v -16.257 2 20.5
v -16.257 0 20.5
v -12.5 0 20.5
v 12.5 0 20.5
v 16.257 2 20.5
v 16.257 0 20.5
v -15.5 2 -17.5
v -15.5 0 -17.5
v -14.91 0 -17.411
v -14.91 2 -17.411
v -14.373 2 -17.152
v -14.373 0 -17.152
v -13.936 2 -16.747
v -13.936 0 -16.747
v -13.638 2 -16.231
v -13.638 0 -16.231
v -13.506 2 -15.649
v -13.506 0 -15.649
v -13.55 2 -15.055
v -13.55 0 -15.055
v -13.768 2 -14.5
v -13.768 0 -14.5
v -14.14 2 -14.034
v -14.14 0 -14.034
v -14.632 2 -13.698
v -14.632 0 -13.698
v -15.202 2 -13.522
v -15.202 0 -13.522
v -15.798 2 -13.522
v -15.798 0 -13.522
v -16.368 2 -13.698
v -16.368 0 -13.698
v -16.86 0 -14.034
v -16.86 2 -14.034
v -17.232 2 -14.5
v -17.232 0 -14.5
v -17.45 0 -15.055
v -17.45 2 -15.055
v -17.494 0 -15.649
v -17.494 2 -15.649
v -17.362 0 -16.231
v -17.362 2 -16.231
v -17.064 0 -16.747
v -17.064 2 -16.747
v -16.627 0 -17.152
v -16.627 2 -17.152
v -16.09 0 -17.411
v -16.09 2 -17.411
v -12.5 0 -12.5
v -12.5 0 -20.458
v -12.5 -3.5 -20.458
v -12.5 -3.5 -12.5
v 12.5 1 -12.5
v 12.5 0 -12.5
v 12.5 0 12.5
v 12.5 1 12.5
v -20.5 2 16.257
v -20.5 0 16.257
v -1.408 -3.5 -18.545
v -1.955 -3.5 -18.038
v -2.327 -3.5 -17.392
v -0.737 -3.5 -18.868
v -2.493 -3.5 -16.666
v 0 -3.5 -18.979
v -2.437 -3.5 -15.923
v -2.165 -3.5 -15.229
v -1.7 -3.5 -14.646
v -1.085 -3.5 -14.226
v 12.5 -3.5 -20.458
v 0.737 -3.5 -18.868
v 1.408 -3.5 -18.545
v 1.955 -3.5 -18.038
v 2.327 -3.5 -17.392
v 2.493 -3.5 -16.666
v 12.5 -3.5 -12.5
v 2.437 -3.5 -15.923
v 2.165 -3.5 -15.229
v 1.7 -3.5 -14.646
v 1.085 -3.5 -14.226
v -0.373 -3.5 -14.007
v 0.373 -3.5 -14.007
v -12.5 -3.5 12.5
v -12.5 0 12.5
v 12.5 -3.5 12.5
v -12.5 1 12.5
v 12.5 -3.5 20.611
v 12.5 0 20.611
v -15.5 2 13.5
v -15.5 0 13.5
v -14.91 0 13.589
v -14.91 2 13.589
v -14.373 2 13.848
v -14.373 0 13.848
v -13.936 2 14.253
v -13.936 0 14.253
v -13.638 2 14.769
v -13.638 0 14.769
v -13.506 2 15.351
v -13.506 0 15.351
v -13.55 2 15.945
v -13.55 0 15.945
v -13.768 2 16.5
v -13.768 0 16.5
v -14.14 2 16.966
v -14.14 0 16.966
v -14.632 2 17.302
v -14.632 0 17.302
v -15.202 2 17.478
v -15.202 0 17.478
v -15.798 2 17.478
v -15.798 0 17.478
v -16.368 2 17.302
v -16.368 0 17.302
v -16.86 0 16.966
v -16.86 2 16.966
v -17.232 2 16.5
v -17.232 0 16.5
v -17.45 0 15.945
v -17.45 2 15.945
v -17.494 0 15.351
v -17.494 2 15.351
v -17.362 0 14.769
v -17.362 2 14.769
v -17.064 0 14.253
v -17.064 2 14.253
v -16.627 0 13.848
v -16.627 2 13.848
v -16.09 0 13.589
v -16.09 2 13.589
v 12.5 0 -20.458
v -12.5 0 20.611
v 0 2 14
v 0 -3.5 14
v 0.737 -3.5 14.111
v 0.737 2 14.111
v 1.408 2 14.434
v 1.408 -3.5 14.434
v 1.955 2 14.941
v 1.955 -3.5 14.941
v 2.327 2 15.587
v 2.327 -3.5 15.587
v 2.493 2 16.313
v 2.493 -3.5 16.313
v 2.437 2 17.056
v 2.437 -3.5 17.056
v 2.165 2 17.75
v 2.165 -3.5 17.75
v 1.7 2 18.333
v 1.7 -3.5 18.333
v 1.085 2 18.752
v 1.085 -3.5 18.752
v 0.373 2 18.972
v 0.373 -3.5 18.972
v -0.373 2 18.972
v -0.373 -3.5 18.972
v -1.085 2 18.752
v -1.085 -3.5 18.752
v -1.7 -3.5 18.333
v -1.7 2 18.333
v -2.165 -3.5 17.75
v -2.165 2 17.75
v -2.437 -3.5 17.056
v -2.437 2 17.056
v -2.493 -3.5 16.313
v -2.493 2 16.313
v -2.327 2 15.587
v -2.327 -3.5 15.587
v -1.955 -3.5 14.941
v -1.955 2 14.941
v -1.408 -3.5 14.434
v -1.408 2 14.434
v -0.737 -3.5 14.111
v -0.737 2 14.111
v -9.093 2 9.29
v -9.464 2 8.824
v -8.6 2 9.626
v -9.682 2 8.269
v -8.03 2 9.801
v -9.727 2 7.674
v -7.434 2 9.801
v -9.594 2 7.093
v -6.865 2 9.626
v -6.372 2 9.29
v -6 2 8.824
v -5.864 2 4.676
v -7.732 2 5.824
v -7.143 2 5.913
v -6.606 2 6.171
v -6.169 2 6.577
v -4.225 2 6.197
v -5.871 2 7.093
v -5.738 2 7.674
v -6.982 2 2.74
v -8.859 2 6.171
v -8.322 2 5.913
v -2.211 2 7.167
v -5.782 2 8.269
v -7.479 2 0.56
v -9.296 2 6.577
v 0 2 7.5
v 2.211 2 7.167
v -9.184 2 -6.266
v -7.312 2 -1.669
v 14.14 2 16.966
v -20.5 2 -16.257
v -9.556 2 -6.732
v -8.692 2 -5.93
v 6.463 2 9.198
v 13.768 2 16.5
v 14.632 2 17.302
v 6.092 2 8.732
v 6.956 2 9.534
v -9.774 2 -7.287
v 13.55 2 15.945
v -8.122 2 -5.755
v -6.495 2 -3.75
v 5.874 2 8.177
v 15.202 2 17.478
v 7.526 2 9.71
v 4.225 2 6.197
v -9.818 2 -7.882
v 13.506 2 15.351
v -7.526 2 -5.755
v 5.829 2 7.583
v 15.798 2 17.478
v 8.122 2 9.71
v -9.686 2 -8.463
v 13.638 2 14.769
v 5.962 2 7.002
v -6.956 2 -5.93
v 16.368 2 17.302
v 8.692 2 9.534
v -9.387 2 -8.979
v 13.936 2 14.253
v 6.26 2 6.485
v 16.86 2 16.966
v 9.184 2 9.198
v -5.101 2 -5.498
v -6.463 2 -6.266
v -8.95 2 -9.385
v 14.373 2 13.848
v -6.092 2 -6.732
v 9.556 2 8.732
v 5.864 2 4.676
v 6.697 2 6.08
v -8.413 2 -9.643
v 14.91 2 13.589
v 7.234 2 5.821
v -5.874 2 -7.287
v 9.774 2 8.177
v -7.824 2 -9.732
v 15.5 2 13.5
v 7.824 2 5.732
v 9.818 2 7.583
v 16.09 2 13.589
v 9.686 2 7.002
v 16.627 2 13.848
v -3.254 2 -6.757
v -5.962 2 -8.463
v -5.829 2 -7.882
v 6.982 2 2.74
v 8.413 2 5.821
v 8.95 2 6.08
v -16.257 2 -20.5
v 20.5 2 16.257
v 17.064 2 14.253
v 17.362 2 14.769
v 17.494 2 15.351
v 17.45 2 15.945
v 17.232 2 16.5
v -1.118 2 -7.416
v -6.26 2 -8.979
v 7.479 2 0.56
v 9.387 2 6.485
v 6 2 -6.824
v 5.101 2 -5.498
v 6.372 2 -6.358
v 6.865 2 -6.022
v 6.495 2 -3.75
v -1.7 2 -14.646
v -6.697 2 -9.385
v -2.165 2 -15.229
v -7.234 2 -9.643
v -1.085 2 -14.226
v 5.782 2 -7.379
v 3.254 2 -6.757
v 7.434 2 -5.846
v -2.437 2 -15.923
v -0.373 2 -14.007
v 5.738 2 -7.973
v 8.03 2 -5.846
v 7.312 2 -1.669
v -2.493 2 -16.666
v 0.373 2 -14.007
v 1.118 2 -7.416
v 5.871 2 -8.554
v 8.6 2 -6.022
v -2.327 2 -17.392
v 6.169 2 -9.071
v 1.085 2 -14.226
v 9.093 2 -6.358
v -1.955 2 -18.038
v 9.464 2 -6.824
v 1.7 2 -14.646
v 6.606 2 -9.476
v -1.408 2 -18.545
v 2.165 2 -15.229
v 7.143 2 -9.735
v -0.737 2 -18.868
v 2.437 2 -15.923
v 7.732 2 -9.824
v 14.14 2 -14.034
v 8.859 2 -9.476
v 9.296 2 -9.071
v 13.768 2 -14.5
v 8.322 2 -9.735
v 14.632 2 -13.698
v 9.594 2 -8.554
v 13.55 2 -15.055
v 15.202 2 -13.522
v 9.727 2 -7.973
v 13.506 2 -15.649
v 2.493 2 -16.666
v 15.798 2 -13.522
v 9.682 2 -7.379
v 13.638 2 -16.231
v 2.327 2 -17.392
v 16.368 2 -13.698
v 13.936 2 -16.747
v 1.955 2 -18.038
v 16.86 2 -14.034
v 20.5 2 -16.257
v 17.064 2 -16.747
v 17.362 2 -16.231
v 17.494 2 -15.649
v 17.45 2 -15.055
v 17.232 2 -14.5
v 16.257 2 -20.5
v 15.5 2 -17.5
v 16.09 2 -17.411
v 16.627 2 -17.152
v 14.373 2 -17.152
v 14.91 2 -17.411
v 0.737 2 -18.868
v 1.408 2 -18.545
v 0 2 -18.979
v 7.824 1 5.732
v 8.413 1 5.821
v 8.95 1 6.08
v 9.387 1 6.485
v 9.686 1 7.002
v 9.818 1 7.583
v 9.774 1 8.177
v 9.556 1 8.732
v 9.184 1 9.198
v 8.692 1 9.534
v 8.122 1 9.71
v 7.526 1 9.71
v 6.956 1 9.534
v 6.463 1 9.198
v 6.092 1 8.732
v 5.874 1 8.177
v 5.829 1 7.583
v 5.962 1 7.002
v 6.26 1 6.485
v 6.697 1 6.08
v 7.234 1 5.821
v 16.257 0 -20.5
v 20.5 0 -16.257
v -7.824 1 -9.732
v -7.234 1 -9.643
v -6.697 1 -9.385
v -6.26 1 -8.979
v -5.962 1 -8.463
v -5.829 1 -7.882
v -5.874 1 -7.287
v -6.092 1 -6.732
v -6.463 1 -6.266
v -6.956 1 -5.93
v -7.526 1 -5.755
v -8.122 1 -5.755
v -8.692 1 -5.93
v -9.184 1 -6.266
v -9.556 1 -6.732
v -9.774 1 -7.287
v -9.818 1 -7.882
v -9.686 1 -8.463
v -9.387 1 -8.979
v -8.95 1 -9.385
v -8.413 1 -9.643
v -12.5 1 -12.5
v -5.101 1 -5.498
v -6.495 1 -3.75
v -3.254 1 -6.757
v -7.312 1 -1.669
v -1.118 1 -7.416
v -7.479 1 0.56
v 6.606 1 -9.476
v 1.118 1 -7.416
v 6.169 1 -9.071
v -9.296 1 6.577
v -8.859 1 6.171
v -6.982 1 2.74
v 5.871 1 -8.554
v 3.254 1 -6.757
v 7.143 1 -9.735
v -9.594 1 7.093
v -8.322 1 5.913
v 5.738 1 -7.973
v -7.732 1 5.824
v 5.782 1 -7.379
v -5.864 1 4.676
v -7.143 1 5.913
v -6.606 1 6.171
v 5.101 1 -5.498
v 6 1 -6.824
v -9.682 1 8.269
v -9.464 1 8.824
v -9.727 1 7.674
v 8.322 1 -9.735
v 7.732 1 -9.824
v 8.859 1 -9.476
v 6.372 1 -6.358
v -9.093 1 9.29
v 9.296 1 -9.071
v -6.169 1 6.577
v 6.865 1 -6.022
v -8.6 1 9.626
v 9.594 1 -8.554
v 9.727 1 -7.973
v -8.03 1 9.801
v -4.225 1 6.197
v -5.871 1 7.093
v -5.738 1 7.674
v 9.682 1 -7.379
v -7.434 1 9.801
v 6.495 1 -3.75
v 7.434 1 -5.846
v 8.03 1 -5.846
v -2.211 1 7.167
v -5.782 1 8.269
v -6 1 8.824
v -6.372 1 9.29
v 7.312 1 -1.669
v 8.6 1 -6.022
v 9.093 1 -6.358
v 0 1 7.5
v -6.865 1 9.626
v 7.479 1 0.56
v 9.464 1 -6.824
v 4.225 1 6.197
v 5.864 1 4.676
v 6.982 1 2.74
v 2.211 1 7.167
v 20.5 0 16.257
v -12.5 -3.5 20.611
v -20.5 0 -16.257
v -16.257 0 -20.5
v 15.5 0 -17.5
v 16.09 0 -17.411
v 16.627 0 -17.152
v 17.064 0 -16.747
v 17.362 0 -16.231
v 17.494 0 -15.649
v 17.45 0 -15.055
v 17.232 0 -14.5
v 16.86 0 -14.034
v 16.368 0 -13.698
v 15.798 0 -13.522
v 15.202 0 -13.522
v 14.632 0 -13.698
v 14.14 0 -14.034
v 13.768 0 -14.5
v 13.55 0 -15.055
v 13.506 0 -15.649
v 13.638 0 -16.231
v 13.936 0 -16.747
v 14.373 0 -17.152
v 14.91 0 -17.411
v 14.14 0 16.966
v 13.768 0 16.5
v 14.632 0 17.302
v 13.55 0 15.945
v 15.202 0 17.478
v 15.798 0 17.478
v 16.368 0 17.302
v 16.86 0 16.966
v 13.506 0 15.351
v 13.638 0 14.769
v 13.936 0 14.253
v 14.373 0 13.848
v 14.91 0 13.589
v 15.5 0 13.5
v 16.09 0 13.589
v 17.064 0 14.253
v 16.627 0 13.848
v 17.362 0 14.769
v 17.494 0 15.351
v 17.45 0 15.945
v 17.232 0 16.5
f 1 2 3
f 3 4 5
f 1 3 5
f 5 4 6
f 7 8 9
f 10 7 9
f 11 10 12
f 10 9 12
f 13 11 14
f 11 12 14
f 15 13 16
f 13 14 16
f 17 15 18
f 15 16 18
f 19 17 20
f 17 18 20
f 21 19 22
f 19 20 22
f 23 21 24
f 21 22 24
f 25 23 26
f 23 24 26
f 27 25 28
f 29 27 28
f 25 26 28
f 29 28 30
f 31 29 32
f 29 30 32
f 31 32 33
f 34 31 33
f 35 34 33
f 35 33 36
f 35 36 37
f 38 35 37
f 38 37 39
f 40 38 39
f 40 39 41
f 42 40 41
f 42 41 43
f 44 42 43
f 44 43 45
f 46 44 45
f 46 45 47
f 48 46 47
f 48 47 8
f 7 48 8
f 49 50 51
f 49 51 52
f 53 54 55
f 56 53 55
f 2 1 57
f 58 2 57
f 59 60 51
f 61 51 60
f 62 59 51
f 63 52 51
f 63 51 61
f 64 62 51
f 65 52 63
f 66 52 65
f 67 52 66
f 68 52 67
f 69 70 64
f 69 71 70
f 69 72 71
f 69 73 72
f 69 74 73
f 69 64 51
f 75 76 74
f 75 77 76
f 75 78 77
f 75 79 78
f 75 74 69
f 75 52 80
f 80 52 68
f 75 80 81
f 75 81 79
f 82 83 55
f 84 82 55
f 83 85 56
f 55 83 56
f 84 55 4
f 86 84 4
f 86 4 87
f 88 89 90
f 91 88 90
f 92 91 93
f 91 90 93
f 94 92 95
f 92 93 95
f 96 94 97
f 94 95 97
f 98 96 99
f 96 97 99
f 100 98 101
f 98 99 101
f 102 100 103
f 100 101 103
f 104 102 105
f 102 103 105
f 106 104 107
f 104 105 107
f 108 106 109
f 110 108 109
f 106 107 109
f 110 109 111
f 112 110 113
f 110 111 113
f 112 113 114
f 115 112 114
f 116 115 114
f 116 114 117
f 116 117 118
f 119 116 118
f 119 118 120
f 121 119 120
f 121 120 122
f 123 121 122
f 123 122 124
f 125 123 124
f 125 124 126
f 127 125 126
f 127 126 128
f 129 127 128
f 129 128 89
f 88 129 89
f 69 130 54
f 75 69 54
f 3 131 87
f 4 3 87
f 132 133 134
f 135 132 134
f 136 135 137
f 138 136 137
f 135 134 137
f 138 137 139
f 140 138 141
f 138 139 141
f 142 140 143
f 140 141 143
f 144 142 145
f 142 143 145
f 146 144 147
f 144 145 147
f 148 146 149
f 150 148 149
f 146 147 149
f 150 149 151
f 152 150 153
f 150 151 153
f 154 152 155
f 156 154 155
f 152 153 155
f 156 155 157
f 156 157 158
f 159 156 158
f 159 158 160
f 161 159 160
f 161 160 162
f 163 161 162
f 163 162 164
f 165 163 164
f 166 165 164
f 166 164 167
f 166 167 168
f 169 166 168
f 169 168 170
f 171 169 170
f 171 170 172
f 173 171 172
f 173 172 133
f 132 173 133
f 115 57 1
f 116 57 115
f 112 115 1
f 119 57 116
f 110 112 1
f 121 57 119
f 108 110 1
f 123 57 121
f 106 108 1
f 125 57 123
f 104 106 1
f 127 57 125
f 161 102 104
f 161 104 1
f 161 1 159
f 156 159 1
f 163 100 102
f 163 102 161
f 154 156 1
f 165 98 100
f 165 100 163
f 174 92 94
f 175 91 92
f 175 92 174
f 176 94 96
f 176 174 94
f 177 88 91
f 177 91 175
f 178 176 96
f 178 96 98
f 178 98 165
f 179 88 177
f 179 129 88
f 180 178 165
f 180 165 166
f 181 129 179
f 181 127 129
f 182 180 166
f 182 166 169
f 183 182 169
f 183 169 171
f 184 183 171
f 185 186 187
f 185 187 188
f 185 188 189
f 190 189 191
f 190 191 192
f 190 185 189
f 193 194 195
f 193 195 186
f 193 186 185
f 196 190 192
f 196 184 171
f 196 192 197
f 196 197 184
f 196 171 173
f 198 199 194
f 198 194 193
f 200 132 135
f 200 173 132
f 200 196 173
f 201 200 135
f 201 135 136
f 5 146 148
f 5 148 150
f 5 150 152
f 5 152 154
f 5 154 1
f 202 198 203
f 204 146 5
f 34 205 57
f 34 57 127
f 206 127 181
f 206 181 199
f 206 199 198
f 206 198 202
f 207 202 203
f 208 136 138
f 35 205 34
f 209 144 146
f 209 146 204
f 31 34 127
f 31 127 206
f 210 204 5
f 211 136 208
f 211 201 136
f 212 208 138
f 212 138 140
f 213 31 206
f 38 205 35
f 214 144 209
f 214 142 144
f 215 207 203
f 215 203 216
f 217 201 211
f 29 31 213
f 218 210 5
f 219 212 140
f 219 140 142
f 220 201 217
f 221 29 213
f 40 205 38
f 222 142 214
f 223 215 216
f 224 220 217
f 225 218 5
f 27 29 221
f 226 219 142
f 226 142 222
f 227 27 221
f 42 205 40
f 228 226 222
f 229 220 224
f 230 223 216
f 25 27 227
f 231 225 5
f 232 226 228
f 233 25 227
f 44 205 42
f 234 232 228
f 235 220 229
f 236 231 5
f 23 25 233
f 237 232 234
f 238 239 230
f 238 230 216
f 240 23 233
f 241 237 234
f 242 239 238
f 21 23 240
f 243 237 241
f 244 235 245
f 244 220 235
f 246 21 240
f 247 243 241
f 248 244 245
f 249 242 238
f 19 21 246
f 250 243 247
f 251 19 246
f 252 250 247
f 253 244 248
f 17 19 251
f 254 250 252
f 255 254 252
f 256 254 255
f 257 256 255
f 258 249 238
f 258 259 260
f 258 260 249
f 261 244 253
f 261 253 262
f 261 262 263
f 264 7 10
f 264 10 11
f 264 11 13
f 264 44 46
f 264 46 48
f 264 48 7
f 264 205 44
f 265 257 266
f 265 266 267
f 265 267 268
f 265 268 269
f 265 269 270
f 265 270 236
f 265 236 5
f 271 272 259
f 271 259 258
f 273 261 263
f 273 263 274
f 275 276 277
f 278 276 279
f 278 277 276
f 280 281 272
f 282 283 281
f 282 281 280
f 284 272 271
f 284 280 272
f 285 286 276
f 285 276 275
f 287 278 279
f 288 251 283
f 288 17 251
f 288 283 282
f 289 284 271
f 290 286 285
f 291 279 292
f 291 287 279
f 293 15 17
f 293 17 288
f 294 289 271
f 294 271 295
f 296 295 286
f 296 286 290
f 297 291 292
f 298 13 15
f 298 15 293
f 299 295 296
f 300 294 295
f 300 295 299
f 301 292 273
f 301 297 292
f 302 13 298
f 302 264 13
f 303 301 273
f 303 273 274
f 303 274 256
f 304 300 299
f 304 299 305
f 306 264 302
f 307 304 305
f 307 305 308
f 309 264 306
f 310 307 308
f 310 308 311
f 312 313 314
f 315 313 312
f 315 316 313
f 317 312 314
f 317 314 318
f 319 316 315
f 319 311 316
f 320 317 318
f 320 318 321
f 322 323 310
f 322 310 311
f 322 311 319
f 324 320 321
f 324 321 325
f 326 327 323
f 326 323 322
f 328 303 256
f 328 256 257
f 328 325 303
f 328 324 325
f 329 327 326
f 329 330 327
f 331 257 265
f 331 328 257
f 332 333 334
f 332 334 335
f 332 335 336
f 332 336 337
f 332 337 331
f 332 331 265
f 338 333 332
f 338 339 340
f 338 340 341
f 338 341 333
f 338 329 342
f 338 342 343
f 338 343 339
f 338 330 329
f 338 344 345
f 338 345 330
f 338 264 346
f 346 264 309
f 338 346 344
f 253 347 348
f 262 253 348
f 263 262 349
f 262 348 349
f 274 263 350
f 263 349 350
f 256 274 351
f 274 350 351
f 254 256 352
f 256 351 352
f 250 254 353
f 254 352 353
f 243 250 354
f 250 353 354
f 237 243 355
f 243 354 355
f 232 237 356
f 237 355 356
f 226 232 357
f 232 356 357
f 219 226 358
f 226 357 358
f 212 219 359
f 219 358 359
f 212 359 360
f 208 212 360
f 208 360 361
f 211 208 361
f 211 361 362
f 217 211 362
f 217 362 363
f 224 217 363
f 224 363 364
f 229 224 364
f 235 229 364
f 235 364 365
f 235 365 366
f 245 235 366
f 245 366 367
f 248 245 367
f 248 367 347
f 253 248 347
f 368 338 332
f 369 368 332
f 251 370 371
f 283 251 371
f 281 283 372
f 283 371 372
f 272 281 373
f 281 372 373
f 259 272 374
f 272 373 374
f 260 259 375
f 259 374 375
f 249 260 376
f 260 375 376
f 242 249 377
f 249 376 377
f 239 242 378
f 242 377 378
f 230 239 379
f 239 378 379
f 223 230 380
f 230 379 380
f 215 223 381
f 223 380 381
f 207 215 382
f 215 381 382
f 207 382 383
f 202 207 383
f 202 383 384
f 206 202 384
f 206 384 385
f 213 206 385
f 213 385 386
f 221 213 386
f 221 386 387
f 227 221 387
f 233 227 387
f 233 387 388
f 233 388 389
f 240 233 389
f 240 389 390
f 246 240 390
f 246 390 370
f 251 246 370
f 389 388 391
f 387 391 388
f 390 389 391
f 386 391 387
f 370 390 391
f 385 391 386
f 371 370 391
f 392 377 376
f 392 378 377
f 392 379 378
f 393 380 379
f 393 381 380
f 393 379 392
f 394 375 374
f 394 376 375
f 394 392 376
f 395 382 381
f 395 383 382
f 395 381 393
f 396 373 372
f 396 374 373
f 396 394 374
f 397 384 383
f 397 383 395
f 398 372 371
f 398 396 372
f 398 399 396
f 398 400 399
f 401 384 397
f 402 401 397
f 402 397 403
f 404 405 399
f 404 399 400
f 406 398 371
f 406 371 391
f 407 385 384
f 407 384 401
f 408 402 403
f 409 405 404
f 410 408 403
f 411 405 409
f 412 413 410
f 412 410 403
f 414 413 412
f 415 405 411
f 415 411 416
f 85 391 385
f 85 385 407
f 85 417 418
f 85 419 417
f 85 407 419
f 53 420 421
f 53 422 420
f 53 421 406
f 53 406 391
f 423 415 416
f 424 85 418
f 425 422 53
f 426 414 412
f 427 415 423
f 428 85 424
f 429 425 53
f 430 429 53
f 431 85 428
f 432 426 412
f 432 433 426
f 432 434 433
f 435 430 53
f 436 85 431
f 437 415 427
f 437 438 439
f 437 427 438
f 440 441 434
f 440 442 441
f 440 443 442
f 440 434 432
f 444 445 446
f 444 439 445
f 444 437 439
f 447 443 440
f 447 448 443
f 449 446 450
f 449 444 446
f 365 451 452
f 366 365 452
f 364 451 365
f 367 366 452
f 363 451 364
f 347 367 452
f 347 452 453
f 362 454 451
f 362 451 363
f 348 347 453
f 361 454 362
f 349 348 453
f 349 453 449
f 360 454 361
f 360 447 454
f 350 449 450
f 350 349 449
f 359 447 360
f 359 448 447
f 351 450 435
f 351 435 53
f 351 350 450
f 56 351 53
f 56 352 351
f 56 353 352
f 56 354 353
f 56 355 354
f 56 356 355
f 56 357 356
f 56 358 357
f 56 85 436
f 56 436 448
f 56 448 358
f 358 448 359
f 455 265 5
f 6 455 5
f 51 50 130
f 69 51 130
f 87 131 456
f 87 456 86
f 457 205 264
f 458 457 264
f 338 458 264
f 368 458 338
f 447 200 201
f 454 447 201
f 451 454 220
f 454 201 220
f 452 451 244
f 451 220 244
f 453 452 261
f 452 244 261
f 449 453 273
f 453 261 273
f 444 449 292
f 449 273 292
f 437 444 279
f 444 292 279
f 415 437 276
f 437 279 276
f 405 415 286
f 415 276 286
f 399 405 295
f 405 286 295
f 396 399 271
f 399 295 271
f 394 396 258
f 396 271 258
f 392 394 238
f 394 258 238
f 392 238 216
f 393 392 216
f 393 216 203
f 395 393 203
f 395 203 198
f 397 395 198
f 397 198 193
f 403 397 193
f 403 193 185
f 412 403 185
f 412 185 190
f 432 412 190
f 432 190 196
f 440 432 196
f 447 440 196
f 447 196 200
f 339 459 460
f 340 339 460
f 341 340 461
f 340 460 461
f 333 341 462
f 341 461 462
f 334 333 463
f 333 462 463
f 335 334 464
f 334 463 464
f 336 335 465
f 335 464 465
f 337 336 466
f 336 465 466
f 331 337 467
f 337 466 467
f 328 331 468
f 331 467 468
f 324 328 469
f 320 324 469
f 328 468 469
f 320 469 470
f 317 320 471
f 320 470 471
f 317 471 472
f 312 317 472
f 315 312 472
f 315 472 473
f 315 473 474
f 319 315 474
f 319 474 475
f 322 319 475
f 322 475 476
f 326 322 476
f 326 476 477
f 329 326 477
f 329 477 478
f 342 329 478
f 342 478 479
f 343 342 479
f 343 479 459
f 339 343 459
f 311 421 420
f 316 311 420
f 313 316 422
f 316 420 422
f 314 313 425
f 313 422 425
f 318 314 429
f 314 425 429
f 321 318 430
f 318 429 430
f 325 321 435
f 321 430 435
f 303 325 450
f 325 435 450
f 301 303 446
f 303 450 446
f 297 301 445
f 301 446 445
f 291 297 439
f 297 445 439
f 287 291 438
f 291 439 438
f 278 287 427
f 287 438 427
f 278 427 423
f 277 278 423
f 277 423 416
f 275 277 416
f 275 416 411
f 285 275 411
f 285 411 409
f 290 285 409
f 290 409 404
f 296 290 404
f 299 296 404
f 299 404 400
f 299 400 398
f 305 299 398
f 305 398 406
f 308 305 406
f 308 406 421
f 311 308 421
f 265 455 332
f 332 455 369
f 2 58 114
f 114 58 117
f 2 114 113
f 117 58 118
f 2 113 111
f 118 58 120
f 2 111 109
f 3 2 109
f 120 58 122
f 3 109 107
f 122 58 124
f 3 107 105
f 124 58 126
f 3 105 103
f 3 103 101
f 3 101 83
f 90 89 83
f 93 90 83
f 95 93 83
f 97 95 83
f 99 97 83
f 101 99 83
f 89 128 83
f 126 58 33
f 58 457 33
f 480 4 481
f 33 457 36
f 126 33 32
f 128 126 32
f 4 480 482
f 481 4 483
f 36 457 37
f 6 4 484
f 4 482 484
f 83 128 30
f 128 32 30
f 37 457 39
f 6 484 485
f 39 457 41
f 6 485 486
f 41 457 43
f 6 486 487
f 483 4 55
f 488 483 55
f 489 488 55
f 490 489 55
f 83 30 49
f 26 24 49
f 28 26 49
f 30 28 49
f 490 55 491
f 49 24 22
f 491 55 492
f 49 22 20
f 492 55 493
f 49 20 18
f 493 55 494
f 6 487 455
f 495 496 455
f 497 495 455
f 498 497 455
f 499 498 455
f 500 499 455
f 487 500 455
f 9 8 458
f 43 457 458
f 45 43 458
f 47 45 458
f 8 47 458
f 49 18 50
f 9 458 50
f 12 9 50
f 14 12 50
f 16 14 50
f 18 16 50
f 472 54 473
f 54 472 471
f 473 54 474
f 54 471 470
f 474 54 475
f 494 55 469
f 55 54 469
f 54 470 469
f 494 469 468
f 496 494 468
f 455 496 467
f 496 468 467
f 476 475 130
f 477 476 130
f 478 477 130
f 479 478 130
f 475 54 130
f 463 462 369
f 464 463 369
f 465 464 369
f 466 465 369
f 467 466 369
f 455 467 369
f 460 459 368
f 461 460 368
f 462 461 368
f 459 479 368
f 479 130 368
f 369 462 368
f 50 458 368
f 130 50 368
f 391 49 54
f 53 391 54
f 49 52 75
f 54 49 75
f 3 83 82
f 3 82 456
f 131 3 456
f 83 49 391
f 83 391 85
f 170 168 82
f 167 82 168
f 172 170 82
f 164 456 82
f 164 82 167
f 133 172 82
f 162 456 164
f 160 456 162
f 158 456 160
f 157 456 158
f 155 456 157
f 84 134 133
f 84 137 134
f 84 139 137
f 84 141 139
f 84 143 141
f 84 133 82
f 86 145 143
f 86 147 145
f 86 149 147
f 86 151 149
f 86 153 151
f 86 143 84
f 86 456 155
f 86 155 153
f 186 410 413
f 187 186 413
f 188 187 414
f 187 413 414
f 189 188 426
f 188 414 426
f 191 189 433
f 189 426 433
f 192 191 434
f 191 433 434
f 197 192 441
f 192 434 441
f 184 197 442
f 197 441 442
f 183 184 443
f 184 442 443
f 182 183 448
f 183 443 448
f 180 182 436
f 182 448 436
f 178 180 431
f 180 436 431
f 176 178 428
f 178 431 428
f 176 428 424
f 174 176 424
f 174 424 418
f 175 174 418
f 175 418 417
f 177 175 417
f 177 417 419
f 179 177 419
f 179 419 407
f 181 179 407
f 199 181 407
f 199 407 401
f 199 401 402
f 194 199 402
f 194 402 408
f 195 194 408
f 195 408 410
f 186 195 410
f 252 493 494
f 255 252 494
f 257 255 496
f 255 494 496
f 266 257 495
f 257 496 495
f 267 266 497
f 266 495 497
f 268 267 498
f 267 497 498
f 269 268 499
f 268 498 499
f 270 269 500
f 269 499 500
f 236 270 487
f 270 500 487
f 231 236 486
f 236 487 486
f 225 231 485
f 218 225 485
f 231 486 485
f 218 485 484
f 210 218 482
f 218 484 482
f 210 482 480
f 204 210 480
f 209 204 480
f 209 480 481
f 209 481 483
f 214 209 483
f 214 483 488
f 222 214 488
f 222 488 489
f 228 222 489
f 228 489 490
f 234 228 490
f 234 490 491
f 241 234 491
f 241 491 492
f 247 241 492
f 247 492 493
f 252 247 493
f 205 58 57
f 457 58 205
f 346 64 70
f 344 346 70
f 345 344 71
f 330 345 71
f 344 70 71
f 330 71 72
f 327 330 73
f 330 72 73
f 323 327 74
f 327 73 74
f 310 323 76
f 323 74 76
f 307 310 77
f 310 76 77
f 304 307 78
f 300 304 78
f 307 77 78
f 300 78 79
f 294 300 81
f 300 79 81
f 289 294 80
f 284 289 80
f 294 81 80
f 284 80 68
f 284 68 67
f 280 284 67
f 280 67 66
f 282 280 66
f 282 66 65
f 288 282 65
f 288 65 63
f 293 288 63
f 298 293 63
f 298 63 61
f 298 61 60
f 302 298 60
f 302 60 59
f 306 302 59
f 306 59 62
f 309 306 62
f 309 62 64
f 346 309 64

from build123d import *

# Parameters (mm, degrees)
SKETCH2_W           = 41
SKETCH2_H           = 41
BOSS_EXTRUDE1_DEPTH = 2
SKETCH3_R           = 2
CUT_EXTRUDE1_DEPTH  = 30.060282173
SKETCH4_R           = 7.5
CUT_EXTRUDE2_DEPTH  = 30.060282173
SKETCH5_W           = 25
SKETCH5_H           = 25
CUT_EXTRUDE3_DEPTH  = 1
CUT_EXTRUDE4_DEPTH  = 30.060282173
SKETCH7_R           = 2
CUT_EXTRUDE5_DEPTH  = 30.060282173
SKETCH8_W           = 25
SKETCH8_H           = 8.111036271
SKETCH8_H_2         = 7.957817611
BOSS_EXTRUDE2_DEPTH = 3.5
SKETCH9_R           = 2.5
CUT_EXTRUDE6_DEPTH  = 30.585719801


with BuildPart() as part:
    # Sketch2 → Boss-Extrude1 (new body)
    with BuildSketch(Plane(origin=(0, 0, 0), x_dir=(1, 0, 0), z_dir=(0, 1, 0))):
        Rectangle(SKETCH2_W, SKETCH2_H)
    extrude(amount=BOSS_EXTRUDE1_DEPTH)

    # Sketch3 → Cut-Extrude1 (cut, through all)
    with BuildSketch(Plane.XZ):
        with Locations(Location((-7.732300971, 7.823779246, 0), (0, 0, 270))):
            Circle(SKETCH3_R)
        with Locations(Location((7.823779246, 7.732300971, 0), (0, 0, 270))):
            Circle(SKETCH3_R)
        with Locations(Location((7.732300971, -7.823779246, 0), (0, 0, 270))):
            Circle(SKETCH3_R)
        with Locations(Location((-7.823779246, -7.732300971, 0), (0, 0, 270))):
            Circle(SKETCH3_R)
    extrude(amount=-CUT_EXTRUDE1_DEPTH, mode=Mode.SUBTRACT)

    # Sketch4 → Cut-Extrude2 (cut, through all)
    with BuildSketch(Plane(origin=(0, 2, 0), x_dir=(1, 0, 0), z_dir=(0, 1, 0))):
        with Locations(Location((0, 0, 0), (0, 0, 270))):
            Circle(SKETCH4_R)
    extrude(amount=-CUT_EXTRUDE2_DEPTH, mode=Mode.SUBTRACT)

    # Sketch5 → Cut-Extrude3 (cut)
    with BuildSketch(Plane.XZ):
        Rectangle(SKETCH5_W, SKETCH5_H)
    extrude(amount=-CUT_EXTRUDE3_DEPTH, mode=Mode.SUBTRACT)

    # Sketch6 → Cut-Extrude4 (cut, through all)
    with BuildSketch(Plane(origin=(0, 2, 0), x_dir=(1, 0, 0), z_dir=(0, 1, 0))):
        Polygon((-20.5, 16.257359313), (-16.257359313, 20.5), (-20.5, 20.5), align=None)
        Polygon((16.257359313, 20.5), (20.5, 16.257359313), (20.5, 20.5), align=None)
        Polygon((20.5, -16.257359313), (16.257359313, -20.5), (20.5, -20.5), align=None)
        Polygon((-16.257359313, -20.5), (-20.5, -16.257359313), (-20.5, -20.5), align=None)
    extrude(amount=-CUT_EXTRUDE4_DEPTH, mode=Mode.SUBTRACT)

    # Sketch7 → Cut-Extrude5 (cut, through all)
    with BuildSketch(Plane.XZ):
        with Locations(Location((-15.5, 15.5, 0), (0, 0, 270))):
            Circle(SKETCH7_R)
        with Locations(Location((15.5, 15.5, 0), (0, 0, 270))):
            Circle(SKETCH7_R)
        with Locations(Location((15.5, -15.5, 0), (0, 0, 270))):
            Circle(SKETCH7_R)
        with Locations(Location((-15.5, -15.5, 0), (0, 0, 270))):
            Circle(SKETCH7_R)
    extrude(amount=-CUT_EXTRUDE5_DEPTH, mode=Mode.SUBTRACT)

    # Sketch8 → Boss-Extrude2 (add)
    with BuildSketch(Plane.XZ):
        with Locations((0, 16.555518136)):
            Rectangle(SKETCH8_W, SKETCH8_H)
        with Locations((0, -16.478908806)):
            Rectangle(SKETCH8_W, SKETCH8_H_2)
    extrude(amount=BOSS_EXTRUDE2_DEPTH)

    # Sketch9 → Cut-Extrude6 (cut, through all)
    with BuildSketch(Plane.XZ.offset(3.5)):
        with Locations(Location((0, 16.5, 0), (0, 0, 270))):
            Circle(SKETCH9_R)
        with Locations(Location((0, -16.478908806, 0), (0, 0, 270))):
            Circle(SKETCH9_R)
    extrude(amount=-CUT_EXTRUDE6_DEPTH, mode=Mode.SUBTRACT)


solid = part.part
